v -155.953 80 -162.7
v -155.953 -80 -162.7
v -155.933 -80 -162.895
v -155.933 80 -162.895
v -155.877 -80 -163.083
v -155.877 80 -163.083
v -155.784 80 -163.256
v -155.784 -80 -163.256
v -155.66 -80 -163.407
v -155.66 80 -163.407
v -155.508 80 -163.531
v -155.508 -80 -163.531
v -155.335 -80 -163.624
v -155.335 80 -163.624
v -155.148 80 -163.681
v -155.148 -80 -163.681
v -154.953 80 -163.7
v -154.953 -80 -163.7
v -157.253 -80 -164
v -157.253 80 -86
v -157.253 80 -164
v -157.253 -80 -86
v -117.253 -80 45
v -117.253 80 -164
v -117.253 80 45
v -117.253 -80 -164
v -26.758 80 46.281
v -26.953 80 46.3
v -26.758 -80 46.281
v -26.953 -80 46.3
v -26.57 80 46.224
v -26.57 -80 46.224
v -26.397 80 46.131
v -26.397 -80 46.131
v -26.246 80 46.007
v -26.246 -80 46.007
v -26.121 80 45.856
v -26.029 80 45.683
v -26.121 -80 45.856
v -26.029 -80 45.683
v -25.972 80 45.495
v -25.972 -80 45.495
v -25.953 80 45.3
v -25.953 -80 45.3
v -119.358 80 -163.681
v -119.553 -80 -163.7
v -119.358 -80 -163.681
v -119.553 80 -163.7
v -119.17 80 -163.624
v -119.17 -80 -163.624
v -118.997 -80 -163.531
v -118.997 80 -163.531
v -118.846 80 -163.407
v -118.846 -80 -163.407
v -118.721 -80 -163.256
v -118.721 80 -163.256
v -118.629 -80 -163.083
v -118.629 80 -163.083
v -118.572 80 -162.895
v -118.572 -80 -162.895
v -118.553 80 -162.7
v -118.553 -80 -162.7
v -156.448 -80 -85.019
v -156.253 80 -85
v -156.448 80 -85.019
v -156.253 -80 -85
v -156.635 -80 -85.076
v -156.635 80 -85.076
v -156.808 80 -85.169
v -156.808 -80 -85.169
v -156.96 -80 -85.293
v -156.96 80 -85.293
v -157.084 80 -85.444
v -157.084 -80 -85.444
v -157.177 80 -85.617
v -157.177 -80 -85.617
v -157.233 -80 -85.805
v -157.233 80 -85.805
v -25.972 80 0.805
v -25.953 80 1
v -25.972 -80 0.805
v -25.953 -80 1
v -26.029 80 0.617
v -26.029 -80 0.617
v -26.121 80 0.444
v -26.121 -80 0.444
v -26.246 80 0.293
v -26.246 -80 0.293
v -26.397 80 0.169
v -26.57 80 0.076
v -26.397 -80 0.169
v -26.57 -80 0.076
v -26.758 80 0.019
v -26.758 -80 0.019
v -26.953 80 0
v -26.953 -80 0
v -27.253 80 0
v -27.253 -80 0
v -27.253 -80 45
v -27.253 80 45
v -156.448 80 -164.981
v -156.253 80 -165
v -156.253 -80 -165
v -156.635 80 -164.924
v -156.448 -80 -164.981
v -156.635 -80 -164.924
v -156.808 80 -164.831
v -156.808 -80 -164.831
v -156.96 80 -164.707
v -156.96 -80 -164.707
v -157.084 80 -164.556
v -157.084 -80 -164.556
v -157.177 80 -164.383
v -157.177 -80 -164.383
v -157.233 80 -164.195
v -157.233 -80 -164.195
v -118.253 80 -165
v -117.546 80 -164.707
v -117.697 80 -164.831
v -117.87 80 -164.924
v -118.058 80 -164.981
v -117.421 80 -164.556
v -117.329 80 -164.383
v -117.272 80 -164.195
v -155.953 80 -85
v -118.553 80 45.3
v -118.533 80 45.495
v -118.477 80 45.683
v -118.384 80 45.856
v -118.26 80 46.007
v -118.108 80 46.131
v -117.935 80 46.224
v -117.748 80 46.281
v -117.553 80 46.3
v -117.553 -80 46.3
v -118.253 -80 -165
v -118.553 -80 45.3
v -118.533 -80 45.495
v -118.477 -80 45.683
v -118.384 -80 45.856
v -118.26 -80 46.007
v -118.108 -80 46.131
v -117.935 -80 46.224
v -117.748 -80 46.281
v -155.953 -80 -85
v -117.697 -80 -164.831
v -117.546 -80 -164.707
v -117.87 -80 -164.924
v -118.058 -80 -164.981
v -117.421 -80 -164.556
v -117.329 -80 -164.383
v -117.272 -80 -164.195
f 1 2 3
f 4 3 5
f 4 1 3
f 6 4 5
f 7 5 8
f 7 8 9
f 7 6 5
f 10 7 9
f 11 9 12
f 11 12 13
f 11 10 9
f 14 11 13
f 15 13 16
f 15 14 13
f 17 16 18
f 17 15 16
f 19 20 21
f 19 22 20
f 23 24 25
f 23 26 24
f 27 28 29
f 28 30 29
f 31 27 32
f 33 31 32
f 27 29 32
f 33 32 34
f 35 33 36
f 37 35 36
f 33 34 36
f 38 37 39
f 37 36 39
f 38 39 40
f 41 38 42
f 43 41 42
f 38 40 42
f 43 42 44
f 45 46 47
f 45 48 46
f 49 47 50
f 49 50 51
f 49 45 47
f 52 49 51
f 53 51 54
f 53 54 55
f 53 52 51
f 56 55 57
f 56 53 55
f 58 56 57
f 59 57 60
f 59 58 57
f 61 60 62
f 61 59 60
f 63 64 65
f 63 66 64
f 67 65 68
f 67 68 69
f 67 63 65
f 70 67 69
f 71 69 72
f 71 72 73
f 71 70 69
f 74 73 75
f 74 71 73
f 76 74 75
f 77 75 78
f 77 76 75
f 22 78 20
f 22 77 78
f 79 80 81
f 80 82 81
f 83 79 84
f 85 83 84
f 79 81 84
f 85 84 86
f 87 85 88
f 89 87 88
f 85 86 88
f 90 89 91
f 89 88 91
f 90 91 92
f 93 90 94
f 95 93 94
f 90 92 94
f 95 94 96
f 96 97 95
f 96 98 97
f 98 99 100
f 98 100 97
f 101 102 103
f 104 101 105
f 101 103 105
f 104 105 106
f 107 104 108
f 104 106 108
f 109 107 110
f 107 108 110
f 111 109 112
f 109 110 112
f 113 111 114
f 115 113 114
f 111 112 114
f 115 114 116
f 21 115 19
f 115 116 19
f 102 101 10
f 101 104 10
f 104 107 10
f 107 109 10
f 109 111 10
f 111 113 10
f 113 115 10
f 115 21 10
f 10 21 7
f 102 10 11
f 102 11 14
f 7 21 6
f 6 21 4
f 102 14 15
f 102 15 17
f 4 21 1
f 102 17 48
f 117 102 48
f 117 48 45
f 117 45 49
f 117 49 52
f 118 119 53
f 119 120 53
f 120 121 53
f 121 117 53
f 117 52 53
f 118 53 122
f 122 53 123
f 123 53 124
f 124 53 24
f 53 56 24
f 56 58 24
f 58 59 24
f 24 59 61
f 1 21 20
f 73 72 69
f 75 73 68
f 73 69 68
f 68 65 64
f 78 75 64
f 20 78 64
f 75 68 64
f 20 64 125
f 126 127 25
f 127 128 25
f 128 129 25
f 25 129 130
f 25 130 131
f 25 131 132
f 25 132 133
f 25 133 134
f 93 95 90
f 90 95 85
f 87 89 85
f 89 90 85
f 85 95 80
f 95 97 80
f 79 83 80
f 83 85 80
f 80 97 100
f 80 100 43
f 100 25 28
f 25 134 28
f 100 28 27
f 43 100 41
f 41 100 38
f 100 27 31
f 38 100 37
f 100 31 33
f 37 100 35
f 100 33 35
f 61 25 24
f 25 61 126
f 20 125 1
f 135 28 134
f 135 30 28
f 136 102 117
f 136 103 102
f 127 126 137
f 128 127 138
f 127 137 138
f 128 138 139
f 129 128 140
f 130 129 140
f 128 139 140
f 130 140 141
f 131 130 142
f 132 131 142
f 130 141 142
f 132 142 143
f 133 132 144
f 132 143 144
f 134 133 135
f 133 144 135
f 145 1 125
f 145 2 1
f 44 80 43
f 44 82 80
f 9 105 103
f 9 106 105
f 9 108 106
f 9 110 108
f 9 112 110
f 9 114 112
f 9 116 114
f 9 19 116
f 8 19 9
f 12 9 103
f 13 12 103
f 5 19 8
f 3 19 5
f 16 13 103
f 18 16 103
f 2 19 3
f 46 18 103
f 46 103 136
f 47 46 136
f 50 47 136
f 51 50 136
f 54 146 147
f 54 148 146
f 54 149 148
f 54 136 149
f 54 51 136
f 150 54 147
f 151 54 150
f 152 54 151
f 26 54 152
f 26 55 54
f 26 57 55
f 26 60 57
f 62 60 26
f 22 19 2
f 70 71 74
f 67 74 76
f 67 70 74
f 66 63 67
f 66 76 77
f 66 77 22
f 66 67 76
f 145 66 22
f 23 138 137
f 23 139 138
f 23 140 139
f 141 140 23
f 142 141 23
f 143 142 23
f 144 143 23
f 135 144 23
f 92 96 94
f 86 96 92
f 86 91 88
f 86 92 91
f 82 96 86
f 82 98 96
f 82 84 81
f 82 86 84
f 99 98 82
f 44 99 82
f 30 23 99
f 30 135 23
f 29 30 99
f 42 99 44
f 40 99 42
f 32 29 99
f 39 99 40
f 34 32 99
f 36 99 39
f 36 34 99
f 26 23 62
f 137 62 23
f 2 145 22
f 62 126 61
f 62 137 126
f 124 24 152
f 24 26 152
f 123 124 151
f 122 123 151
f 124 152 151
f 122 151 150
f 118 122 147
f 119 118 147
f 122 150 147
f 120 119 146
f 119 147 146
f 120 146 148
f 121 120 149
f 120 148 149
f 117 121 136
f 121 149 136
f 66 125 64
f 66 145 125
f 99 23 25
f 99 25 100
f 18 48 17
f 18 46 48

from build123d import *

# Parameters (mm, degrees)
F1_DEPTH = 80
F2_R     = 1


with BuildPart() as f1:
    # F0 (on Front) → F1 (new body, symmetric)
    with BuildSketch(Plane.XZ):
        Polygon((-155.952706, -85), (-157.252706, -85), (-157.252706, -165), (-117.252706, -165), (-117.252706, 45), (-27.252706, 45), (-27.252706, 0), (-25.952706, 0), (-25.952706, 46.3), (-118.552706, 46.3), (-118.552706, -163.7), (-155.952706, -163.7), align=None)
    extrude(amount=F1_DEPTH, both=True)

    # F2
    f2_edges = [f1.edges().sort_by_distance(p)[0] for p in [
        (-118.552706, 0, 46.3),
        (-25.952706, 0, 46.3),
        (-117.252706, 0, -165),
        (-157.252706, 0, -165),
        (-25.952706, 0, 0),
        (-157.252706, 0, -85),
        (-155.952706, 0, -163.7),
        (-118.552706, 0, -163.7),
    ]]
    fillet(f2_edges, radius=F2_R)


solid = f1.part
